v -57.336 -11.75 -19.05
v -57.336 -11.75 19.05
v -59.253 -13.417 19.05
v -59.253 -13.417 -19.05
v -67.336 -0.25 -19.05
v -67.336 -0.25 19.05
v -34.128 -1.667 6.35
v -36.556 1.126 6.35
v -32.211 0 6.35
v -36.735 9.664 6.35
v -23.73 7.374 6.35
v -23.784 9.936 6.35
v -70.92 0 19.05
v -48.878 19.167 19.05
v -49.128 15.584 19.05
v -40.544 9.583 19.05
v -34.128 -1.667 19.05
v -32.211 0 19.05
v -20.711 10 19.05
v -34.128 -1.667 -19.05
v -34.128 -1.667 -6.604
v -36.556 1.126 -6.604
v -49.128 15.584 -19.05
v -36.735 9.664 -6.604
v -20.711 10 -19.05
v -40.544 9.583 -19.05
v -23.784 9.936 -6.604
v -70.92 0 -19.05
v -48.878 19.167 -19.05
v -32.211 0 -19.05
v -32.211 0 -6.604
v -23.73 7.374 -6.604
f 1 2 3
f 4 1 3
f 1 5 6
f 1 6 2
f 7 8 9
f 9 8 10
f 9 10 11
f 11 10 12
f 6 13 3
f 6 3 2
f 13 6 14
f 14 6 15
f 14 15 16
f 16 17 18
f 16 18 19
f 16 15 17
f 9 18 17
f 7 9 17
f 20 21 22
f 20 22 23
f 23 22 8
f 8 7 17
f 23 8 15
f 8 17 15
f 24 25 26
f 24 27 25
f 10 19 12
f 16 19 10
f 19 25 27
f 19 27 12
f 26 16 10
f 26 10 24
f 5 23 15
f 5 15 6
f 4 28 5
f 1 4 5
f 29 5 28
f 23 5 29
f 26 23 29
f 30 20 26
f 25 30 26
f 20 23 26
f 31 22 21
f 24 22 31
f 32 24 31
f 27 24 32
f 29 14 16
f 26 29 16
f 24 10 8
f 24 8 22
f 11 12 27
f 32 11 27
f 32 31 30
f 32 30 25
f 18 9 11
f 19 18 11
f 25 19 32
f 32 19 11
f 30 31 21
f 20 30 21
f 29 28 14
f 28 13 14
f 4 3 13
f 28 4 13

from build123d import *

# Parameters (mm, degrees)
EXTRUDE_THIN1_DEPTH            = 19.05
SKETCH8_W                      = 15.24
SKETCH8_H                      = 38.1
BOSS_EXTRUDE1_DEPTH            = 12.7
CUT_EXTRUDE1_DEPTH             = 83.853768552
CUT_EXTRUDE1_DEPTH_BACK        = 83.853768552
CUT_EXTRUDE2_REACH             = 79.008
SKETCH10_W                     = 12.954
SKETCH10_H                     = 12.954
CUT_EXTRUDE2_DIRECTION_2_DEPTH = 78.007738646


with BuildPart() as part:
    # Sketch1 → Extrude-Thin1 (new, symmetric)
    with BuildSketch(Plane.XY):
        Polygon((-59.25293848, -13.416886184), (-70.919796031, 0), (-48.877768729, 19.166980263), (-32.21082937, 0), (-34.127527396, -1.666693936), (-49.127772819, 15.583588301), (-67.336404069, -0.25000409), (-57.336240454, -11.750192248), align=None)
    extrude(amount=EXTRUDE_THIN1_DEPTH, both=True)

    # Sketch8 → Boss-Extrude1 (add)
    with BuildSketch(Plane(origin=(-13.869033098, 15.949388063, 0), x_dir=(0.7546055221635044, 0.656178714924787, 0), z_dir=(0.656178714924787, -0.7546055221635044, 0))):
        with Locations((-16.686469716, 0)):
            Rectangle(SKETCH8_W, SKETCH8_H)
    extrude(amount=-BOSS_EXTRUDE1_DEPTH)

    # Sketch9 → Cut-Extrude1 (cut, two sides: drawn at the far end of the back side and taken through both)
    with BuildSketch(Plane(origin=(0, 0, -19.05), x_dir=(-1, 0, 0), z_dir=(0, 0, -1)).offset(-CUT_EXTRUDE1_DEPTH_BACK)):
        Polygon((20.710641212, 10.000163615), (40.544299049, 9.583490131), (29.044110892, 19.583653747), align=None)
    extrude(amount=CUT_EXTRUDE1_DEPTH + CUT_EXTRUDE1_DEPTH_BACK, mode=Mode.SUBTRACT)

    # Sketch10 → Cut-Extrude2 (cut, up to next)
    with BuildSketch(Plane(origin=(-0.21913146, 10.430657518, 0), x_dir=(0.9997793965144279, 0.02100376883433655, 0), z_dir=(-0.02100376883433655, 0.9997793965144279, 0)), mode=Mode.PRIVATE) as cut_extrude2_sk1:
        with Locations((-30.047065424, 0.127)):
            Rectangle(SKETCH10_W, SKETCH10_H)
    cut_extrude2_tool1 = extrude(cut_extrude2_sk1.sketch, amount=-CUT_EXTRUDE2_REACH, mode=Mode.PRIVATE) & part.part
    add(cut_extrude2_tool1.solids().sort_by_distance((-30.259568, 9.799556, -0.127))[0], mode=Mode.SUBTRACT)

    # Sketch10 → Cut-Extrude2 direction 2 (cut)
    with BuildSketch(Plane(origin=(-0.21913146, 10.430657518, 0), x_dir=(0.9997793965144279, 0.02100376883433655, 0), z_dir=(-0.02100376883433655, 0.9997793965144279, 0))):
        with Locations((-30.047065424, 0.127)):
            Rectangle(SKETCH10_W, SKETCH10_H)
    extrude(amount=CUT_EXTRUDE2_DIRECTION_2_DEPTH, mode=Mode.SUBTRACT)


solid = part.part
